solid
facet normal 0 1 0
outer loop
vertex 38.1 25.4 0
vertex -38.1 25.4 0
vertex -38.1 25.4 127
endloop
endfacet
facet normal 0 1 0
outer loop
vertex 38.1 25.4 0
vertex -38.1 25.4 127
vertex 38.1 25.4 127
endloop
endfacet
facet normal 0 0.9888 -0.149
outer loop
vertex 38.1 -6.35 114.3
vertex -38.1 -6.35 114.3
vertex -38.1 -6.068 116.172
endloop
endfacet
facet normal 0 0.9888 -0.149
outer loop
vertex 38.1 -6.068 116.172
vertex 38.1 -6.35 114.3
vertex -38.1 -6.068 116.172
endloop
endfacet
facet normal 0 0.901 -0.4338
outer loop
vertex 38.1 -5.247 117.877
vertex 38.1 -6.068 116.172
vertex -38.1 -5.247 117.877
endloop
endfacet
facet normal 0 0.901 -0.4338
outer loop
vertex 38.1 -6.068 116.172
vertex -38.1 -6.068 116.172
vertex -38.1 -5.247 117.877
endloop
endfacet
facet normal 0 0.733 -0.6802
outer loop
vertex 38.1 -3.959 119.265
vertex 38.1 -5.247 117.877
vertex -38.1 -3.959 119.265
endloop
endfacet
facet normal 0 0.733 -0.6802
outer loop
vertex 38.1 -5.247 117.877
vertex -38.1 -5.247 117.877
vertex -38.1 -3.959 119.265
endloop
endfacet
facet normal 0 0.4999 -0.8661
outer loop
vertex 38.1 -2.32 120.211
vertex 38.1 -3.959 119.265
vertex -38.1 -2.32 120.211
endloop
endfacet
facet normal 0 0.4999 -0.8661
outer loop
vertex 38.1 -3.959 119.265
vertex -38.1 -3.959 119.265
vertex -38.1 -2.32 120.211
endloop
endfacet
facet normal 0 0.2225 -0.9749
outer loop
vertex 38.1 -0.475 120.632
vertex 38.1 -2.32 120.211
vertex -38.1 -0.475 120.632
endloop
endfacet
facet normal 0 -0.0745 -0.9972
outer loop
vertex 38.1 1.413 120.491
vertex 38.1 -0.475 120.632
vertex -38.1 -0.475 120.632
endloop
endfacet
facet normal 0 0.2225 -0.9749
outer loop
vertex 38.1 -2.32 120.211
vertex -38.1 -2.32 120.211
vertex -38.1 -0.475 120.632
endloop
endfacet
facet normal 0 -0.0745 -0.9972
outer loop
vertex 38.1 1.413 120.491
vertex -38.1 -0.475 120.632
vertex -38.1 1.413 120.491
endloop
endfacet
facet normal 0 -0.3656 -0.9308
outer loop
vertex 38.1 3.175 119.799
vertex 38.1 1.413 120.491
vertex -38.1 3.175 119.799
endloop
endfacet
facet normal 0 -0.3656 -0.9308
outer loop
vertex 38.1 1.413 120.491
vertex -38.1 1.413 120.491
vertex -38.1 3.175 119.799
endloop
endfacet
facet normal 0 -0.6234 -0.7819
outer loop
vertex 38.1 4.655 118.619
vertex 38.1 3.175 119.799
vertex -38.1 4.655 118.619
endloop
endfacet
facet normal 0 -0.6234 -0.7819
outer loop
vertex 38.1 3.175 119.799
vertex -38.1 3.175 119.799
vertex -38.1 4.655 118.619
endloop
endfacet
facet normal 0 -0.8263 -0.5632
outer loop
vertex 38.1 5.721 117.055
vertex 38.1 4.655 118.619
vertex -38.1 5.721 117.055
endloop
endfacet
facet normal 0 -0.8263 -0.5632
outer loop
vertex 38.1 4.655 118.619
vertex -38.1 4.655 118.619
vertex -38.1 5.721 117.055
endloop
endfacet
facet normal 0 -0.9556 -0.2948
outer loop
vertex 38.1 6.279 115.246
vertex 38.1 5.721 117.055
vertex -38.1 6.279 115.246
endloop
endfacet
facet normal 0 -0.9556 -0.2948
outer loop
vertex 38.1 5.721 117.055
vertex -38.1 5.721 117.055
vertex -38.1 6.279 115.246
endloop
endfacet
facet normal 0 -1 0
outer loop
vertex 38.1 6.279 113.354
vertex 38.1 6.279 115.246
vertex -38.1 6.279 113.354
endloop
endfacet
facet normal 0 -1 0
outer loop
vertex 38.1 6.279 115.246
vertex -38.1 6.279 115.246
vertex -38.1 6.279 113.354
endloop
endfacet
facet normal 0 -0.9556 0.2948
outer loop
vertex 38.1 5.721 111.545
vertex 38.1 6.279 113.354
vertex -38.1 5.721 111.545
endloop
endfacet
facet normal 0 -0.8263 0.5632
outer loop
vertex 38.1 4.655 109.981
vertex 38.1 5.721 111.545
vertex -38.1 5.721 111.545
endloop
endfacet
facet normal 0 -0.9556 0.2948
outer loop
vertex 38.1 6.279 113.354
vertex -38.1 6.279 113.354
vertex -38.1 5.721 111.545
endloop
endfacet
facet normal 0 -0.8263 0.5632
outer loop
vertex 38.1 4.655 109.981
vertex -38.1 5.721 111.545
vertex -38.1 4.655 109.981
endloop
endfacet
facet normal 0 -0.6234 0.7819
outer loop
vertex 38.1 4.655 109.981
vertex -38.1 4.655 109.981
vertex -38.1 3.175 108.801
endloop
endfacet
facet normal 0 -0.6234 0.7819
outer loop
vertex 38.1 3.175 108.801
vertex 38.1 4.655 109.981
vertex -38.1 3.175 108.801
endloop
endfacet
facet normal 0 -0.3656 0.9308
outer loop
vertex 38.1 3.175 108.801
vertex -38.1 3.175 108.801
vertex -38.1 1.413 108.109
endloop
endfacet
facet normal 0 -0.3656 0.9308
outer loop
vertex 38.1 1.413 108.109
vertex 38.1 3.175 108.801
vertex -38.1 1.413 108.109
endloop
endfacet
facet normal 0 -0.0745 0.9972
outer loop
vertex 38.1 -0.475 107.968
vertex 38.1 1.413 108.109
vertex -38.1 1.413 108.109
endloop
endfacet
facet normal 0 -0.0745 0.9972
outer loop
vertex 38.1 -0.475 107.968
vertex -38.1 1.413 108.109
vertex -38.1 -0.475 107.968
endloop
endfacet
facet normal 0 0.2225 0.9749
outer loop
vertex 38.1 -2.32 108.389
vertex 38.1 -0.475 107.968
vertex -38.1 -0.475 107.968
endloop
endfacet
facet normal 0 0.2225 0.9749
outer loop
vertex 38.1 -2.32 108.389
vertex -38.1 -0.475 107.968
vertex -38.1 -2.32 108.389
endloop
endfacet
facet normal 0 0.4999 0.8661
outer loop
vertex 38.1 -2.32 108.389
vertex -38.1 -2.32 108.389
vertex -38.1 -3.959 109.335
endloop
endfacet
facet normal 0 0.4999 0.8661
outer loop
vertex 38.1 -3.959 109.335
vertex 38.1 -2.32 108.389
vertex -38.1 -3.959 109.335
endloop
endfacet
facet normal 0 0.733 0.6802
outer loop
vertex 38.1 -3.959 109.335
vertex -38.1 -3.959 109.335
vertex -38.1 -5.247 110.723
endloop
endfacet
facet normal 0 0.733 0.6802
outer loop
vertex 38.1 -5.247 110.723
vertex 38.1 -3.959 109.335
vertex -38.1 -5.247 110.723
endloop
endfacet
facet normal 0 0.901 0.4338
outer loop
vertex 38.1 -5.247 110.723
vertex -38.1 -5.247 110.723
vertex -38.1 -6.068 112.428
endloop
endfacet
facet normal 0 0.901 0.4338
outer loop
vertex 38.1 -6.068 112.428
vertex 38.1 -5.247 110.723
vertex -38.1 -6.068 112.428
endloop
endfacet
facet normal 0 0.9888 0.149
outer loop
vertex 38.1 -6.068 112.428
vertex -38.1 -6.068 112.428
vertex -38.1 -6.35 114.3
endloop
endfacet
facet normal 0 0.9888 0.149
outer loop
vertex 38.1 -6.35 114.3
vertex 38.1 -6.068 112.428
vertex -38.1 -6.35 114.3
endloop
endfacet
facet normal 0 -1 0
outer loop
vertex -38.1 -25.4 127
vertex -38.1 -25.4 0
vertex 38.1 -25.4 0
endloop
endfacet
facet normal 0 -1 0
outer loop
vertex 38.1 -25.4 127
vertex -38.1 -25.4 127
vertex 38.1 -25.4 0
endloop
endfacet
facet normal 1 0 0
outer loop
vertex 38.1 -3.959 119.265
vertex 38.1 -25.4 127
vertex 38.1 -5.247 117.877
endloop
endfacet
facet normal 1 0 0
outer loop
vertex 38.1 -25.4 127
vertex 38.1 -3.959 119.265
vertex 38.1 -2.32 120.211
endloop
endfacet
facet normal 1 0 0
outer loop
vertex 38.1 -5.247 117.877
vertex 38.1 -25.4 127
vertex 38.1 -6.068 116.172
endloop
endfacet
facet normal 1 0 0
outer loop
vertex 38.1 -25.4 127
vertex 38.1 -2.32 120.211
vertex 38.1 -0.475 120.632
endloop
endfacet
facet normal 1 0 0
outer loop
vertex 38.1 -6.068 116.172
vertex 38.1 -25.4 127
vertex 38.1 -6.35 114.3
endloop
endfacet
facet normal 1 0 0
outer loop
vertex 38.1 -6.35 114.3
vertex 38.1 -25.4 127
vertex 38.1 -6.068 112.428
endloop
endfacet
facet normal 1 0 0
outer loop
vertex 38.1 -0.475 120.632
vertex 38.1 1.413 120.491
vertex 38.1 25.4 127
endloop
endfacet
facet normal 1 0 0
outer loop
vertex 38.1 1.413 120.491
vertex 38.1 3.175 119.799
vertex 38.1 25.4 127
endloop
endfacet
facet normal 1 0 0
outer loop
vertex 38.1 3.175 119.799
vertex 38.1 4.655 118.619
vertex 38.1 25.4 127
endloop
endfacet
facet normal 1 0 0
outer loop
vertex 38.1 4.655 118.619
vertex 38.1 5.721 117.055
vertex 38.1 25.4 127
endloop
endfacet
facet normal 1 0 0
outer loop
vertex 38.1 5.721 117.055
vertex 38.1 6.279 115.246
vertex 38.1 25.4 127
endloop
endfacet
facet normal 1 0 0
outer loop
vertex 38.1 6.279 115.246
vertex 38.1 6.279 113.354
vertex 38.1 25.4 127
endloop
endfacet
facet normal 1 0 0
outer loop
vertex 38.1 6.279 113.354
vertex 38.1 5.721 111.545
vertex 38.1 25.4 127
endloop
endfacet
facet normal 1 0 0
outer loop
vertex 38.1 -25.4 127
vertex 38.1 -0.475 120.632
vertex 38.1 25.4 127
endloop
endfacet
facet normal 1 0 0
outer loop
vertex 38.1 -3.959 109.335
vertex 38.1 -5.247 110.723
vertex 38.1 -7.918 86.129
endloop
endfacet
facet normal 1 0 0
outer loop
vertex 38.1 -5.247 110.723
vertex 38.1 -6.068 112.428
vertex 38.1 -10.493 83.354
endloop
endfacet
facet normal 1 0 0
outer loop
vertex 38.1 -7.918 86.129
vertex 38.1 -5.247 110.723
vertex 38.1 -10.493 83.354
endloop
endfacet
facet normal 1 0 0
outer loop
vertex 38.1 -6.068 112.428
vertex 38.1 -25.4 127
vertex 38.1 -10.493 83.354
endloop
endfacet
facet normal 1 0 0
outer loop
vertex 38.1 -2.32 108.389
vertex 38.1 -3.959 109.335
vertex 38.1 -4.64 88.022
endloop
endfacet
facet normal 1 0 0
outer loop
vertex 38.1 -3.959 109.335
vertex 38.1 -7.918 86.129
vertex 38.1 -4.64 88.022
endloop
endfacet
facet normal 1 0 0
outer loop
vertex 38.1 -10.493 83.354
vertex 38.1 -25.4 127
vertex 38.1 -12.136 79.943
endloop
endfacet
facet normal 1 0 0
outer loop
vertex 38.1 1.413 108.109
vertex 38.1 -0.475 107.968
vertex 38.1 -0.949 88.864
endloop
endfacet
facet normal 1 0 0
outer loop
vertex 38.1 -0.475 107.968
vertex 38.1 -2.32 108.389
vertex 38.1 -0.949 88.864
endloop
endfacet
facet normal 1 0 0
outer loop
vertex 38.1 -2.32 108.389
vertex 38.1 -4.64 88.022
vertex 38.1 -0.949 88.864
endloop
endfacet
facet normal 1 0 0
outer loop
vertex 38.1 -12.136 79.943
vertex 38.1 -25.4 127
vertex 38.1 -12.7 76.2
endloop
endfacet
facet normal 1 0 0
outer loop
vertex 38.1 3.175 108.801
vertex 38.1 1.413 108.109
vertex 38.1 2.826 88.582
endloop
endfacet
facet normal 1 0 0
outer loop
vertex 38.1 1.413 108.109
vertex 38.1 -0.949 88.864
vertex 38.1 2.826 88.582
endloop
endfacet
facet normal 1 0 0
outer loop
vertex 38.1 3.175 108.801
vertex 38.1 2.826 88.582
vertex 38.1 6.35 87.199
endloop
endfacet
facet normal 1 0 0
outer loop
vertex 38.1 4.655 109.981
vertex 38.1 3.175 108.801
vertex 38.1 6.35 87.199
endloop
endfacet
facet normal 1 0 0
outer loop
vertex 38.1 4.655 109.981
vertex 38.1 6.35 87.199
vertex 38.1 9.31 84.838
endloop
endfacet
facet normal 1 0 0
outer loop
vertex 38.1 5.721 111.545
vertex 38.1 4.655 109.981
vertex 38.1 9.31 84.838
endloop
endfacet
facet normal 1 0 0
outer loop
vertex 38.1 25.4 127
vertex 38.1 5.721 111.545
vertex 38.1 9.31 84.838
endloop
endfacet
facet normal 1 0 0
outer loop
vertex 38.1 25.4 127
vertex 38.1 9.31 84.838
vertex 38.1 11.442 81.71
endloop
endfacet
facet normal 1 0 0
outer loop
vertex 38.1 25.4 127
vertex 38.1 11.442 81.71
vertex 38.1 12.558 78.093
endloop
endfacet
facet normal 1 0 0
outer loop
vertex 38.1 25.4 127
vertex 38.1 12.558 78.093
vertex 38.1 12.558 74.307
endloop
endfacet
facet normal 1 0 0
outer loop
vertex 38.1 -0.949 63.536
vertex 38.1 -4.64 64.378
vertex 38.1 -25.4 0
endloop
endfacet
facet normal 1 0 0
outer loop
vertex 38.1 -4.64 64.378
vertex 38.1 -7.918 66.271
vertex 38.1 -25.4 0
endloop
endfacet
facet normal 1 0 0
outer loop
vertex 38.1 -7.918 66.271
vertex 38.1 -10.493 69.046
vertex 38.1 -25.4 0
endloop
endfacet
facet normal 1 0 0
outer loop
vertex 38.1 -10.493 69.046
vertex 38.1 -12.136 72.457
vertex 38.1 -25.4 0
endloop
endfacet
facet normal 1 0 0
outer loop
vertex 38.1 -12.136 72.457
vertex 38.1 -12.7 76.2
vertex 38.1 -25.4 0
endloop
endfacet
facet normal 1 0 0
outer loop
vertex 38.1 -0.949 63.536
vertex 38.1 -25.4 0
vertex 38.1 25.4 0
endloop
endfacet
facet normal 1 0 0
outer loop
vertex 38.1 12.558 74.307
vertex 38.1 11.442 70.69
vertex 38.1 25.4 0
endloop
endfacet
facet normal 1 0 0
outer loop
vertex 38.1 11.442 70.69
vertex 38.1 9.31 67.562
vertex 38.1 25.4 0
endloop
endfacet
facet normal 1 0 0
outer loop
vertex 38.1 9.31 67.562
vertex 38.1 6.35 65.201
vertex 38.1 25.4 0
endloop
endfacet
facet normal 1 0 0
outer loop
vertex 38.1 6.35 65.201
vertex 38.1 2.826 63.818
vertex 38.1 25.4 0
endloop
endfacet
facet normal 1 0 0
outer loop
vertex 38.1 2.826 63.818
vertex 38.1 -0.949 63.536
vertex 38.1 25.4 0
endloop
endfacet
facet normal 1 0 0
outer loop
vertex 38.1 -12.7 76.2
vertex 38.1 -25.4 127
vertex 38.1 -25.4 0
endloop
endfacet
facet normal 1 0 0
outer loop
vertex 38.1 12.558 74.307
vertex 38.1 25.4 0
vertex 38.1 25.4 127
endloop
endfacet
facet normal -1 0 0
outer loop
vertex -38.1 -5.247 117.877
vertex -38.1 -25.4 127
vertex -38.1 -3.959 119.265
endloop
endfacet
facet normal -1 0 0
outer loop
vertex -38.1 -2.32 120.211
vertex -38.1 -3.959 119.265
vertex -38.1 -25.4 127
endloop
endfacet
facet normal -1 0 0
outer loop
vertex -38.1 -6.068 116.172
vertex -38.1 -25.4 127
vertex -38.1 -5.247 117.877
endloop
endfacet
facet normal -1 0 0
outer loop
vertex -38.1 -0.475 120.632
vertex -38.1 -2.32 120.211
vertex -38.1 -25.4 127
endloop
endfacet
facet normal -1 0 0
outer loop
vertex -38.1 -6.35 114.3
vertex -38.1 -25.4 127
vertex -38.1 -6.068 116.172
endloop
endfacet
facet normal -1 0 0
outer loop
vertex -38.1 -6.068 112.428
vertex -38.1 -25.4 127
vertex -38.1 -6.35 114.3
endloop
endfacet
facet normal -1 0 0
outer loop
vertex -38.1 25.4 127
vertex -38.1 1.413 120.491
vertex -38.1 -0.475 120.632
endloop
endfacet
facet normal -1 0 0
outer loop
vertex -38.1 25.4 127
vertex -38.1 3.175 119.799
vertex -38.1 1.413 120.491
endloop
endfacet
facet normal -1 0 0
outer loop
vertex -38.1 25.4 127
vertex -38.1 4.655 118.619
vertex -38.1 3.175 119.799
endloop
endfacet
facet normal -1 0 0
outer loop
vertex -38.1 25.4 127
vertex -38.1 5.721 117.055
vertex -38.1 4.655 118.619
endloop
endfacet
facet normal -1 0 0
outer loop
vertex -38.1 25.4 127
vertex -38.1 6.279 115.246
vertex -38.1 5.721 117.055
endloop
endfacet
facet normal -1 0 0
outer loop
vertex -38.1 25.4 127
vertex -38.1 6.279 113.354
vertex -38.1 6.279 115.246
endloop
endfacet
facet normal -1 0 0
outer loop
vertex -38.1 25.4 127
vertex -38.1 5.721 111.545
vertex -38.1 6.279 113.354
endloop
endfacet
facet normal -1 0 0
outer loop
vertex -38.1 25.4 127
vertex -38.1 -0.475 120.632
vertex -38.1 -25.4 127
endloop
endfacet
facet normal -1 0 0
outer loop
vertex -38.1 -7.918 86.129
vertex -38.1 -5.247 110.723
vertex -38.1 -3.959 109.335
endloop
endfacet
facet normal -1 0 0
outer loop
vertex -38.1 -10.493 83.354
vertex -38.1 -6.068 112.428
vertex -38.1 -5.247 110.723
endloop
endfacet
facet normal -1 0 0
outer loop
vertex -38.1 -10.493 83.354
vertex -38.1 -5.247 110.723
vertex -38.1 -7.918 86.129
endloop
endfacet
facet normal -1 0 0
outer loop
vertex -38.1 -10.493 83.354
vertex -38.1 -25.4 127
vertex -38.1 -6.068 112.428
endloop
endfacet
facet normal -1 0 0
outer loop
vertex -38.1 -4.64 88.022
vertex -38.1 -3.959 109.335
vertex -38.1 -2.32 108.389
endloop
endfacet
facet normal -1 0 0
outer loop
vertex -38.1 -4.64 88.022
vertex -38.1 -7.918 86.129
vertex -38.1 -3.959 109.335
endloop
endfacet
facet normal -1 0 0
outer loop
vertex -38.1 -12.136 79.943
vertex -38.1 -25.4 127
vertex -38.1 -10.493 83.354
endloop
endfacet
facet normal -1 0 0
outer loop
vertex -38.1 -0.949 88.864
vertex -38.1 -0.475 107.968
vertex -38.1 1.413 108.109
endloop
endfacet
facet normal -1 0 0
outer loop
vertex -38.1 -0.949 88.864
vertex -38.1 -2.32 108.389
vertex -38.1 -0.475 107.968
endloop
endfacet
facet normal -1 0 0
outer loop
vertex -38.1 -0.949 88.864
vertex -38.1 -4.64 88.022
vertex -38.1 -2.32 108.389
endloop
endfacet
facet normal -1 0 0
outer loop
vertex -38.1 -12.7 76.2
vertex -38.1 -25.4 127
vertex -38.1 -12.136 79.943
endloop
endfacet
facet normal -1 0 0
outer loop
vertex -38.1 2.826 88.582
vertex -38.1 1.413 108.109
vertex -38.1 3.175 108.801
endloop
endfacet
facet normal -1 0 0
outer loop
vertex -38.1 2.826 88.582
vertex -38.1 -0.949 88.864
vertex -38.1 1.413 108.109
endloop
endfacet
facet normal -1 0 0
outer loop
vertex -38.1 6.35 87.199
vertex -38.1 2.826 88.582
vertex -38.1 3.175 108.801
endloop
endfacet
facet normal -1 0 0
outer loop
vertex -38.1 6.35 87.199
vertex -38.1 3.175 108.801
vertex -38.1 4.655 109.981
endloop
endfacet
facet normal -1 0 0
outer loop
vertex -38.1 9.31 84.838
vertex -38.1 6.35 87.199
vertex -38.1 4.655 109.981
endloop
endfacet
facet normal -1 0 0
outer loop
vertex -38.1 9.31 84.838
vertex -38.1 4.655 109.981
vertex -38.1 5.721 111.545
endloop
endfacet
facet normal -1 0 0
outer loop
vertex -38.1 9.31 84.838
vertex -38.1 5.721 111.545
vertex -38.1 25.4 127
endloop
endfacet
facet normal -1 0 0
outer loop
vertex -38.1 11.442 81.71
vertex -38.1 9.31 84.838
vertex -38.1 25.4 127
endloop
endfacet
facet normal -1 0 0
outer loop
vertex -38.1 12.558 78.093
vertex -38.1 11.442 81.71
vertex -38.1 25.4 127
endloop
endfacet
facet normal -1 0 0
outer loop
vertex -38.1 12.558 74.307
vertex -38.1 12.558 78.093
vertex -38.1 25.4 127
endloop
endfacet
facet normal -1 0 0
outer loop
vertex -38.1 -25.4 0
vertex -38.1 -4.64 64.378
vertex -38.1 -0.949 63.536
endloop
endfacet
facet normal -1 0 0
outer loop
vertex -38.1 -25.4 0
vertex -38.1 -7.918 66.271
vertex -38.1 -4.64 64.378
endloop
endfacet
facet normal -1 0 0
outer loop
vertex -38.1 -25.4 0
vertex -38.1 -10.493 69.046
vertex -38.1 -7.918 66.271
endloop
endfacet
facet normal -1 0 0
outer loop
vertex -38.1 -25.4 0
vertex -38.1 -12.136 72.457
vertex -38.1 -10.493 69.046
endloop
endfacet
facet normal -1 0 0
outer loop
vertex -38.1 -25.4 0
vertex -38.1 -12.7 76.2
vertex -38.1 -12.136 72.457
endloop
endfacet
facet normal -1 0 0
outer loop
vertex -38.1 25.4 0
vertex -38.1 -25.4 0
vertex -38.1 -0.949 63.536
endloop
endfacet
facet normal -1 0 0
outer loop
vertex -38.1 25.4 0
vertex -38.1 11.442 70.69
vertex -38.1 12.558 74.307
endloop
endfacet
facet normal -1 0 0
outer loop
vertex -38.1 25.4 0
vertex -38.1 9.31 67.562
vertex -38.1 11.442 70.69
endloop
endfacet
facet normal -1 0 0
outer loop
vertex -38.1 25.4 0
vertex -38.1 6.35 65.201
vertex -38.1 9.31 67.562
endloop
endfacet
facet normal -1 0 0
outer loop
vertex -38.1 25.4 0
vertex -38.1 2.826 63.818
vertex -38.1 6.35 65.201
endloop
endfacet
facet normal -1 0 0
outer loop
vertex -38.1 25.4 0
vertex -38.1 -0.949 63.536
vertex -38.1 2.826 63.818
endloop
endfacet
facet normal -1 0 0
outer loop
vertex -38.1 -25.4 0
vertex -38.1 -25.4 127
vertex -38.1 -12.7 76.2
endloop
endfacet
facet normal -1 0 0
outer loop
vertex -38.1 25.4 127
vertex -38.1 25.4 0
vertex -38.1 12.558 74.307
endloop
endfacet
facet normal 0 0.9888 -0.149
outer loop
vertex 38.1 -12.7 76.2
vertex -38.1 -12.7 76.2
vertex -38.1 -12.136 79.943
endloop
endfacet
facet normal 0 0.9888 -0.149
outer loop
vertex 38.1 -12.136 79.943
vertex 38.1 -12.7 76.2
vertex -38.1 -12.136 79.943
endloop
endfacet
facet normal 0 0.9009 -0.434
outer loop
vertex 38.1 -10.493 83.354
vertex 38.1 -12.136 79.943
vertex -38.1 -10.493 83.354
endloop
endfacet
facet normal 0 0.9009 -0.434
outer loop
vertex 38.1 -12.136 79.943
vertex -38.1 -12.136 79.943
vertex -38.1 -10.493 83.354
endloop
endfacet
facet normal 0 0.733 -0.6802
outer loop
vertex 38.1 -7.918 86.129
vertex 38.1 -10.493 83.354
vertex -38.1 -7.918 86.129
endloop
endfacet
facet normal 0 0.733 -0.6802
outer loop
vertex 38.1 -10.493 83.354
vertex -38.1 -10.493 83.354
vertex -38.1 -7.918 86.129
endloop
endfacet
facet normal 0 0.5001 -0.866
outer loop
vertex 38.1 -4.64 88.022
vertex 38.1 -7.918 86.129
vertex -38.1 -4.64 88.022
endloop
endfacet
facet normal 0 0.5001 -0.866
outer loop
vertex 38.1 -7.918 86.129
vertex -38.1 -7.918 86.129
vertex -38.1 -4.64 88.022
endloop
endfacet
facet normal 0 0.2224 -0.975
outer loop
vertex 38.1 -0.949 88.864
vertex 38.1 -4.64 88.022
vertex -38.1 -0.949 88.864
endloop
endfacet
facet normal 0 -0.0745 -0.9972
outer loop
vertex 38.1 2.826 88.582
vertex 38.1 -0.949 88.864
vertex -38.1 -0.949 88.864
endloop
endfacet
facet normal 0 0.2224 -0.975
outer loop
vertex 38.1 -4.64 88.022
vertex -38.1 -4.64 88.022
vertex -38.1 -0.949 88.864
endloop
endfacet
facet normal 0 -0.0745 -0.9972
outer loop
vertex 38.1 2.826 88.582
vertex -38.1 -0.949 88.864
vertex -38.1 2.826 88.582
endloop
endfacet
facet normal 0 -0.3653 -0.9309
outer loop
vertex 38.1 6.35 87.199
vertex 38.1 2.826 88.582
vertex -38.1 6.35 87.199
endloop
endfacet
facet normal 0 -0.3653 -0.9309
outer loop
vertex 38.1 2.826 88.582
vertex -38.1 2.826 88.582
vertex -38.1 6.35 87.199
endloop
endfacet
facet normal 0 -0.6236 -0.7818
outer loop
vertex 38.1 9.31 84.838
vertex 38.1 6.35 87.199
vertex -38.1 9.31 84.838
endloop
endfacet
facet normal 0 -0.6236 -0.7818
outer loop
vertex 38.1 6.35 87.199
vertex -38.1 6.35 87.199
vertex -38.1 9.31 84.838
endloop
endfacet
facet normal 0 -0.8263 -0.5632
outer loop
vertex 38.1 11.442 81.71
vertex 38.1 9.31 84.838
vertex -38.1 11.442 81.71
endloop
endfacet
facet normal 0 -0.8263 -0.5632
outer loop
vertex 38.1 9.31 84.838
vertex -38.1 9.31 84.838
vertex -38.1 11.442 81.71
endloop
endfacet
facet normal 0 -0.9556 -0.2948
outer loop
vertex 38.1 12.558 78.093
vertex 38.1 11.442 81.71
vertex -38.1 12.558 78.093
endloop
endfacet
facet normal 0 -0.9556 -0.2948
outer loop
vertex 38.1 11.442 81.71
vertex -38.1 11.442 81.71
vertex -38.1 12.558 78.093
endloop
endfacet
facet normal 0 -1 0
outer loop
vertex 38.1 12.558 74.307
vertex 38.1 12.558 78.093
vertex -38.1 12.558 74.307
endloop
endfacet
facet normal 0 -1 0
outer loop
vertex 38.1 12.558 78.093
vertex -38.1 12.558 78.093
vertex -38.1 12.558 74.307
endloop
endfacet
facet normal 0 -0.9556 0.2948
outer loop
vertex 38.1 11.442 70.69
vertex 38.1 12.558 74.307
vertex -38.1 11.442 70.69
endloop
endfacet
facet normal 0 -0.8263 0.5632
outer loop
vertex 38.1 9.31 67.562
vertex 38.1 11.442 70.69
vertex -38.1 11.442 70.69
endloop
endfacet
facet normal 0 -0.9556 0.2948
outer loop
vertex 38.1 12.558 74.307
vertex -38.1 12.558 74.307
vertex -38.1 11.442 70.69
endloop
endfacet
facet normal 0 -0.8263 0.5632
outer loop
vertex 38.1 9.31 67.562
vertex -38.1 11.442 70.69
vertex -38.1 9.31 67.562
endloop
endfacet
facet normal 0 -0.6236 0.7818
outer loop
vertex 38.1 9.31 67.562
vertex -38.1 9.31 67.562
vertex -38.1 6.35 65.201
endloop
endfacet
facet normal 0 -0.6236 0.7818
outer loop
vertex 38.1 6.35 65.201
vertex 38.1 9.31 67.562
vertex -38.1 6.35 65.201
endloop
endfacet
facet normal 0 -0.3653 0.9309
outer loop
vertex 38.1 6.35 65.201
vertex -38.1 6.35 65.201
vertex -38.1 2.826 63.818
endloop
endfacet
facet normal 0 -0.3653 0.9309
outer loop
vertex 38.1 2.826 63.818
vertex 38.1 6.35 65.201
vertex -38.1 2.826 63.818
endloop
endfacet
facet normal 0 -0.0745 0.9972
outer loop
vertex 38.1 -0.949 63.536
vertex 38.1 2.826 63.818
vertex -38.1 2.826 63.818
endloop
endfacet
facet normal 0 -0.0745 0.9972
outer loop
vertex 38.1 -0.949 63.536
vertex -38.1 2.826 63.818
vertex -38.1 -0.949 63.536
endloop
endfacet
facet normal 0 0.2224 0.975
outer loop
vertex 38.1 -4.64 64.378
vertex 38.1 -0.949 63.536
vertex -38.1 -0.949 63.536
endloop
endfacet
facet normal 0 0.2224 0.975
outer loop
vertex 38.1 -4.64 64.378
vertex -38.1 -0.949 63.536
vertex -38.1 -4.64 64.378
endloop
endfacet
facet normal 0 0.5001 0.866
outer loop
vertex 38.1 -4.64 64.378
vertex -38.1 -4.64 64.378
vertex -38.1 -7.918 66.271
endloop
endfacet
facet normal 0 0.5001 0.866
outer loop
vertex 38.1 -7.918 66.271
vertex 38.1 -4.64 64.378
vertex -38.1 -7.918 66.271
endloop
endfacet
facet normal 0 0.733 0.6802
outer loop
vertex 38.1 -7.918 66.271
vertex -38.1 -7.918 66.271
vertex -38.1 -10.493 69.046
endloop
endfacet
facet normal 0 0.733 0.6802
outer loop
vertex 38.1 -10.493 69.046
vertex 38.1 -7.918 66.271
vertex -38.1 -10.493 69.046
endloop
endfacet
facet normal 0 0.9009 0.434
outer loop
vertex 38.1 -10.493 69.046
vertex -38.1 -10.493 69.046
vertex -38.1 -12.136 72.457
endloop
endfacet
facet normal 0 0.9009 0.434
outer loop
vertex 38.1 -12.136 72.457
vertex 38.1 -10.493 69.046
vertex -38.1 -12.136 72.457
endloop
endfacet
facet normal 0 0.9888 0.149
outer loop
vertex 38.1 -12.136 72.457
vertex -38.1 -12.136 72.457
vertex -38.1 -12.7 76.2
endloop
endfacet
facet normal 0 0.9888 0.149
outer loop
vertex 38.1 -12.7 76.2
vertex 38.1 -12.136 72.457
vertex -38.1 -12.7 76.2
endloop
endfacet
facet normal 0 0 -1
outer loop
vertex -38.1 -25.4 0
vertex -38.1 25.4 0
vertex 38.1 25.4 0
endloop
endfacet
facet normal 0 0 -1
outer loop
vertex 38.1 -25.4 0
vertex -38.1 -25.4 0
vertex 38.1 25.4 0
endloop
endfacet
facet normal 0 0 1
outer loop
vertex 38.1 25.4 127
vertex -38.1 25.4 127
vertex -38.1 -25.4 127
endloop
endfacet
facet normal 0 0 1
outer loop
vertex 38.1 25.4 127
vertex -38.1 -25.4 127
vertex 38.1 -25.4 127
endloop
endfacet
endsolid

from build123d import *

# Parameters (mm, degrees)
F0_W     = 76.2
F0_H     = 50.8
F1_DEPTH = 127
F3_D     = 25.4
F5_D     = 12.7


with BuildPart() as f1:
    # F0 (on Top) → F1 (new body)
    with BuildSketch(Plane.XY):
        Rectangle(F0_W, F0_H)
    extrude(amount=F1_DEPTH)

    # F3 (through all)
    with Locations(Plane.YZ.offset(38.1)):
        with Locations((0, 76.2)):
            Hole(F3_D / 2)

    # F5 (through all)
    with Locations(Plane.YZ.offset(38.1)):
        with Locations((0, 114.3)):
            Hole(F5_D / 2)


solid = f1.part
